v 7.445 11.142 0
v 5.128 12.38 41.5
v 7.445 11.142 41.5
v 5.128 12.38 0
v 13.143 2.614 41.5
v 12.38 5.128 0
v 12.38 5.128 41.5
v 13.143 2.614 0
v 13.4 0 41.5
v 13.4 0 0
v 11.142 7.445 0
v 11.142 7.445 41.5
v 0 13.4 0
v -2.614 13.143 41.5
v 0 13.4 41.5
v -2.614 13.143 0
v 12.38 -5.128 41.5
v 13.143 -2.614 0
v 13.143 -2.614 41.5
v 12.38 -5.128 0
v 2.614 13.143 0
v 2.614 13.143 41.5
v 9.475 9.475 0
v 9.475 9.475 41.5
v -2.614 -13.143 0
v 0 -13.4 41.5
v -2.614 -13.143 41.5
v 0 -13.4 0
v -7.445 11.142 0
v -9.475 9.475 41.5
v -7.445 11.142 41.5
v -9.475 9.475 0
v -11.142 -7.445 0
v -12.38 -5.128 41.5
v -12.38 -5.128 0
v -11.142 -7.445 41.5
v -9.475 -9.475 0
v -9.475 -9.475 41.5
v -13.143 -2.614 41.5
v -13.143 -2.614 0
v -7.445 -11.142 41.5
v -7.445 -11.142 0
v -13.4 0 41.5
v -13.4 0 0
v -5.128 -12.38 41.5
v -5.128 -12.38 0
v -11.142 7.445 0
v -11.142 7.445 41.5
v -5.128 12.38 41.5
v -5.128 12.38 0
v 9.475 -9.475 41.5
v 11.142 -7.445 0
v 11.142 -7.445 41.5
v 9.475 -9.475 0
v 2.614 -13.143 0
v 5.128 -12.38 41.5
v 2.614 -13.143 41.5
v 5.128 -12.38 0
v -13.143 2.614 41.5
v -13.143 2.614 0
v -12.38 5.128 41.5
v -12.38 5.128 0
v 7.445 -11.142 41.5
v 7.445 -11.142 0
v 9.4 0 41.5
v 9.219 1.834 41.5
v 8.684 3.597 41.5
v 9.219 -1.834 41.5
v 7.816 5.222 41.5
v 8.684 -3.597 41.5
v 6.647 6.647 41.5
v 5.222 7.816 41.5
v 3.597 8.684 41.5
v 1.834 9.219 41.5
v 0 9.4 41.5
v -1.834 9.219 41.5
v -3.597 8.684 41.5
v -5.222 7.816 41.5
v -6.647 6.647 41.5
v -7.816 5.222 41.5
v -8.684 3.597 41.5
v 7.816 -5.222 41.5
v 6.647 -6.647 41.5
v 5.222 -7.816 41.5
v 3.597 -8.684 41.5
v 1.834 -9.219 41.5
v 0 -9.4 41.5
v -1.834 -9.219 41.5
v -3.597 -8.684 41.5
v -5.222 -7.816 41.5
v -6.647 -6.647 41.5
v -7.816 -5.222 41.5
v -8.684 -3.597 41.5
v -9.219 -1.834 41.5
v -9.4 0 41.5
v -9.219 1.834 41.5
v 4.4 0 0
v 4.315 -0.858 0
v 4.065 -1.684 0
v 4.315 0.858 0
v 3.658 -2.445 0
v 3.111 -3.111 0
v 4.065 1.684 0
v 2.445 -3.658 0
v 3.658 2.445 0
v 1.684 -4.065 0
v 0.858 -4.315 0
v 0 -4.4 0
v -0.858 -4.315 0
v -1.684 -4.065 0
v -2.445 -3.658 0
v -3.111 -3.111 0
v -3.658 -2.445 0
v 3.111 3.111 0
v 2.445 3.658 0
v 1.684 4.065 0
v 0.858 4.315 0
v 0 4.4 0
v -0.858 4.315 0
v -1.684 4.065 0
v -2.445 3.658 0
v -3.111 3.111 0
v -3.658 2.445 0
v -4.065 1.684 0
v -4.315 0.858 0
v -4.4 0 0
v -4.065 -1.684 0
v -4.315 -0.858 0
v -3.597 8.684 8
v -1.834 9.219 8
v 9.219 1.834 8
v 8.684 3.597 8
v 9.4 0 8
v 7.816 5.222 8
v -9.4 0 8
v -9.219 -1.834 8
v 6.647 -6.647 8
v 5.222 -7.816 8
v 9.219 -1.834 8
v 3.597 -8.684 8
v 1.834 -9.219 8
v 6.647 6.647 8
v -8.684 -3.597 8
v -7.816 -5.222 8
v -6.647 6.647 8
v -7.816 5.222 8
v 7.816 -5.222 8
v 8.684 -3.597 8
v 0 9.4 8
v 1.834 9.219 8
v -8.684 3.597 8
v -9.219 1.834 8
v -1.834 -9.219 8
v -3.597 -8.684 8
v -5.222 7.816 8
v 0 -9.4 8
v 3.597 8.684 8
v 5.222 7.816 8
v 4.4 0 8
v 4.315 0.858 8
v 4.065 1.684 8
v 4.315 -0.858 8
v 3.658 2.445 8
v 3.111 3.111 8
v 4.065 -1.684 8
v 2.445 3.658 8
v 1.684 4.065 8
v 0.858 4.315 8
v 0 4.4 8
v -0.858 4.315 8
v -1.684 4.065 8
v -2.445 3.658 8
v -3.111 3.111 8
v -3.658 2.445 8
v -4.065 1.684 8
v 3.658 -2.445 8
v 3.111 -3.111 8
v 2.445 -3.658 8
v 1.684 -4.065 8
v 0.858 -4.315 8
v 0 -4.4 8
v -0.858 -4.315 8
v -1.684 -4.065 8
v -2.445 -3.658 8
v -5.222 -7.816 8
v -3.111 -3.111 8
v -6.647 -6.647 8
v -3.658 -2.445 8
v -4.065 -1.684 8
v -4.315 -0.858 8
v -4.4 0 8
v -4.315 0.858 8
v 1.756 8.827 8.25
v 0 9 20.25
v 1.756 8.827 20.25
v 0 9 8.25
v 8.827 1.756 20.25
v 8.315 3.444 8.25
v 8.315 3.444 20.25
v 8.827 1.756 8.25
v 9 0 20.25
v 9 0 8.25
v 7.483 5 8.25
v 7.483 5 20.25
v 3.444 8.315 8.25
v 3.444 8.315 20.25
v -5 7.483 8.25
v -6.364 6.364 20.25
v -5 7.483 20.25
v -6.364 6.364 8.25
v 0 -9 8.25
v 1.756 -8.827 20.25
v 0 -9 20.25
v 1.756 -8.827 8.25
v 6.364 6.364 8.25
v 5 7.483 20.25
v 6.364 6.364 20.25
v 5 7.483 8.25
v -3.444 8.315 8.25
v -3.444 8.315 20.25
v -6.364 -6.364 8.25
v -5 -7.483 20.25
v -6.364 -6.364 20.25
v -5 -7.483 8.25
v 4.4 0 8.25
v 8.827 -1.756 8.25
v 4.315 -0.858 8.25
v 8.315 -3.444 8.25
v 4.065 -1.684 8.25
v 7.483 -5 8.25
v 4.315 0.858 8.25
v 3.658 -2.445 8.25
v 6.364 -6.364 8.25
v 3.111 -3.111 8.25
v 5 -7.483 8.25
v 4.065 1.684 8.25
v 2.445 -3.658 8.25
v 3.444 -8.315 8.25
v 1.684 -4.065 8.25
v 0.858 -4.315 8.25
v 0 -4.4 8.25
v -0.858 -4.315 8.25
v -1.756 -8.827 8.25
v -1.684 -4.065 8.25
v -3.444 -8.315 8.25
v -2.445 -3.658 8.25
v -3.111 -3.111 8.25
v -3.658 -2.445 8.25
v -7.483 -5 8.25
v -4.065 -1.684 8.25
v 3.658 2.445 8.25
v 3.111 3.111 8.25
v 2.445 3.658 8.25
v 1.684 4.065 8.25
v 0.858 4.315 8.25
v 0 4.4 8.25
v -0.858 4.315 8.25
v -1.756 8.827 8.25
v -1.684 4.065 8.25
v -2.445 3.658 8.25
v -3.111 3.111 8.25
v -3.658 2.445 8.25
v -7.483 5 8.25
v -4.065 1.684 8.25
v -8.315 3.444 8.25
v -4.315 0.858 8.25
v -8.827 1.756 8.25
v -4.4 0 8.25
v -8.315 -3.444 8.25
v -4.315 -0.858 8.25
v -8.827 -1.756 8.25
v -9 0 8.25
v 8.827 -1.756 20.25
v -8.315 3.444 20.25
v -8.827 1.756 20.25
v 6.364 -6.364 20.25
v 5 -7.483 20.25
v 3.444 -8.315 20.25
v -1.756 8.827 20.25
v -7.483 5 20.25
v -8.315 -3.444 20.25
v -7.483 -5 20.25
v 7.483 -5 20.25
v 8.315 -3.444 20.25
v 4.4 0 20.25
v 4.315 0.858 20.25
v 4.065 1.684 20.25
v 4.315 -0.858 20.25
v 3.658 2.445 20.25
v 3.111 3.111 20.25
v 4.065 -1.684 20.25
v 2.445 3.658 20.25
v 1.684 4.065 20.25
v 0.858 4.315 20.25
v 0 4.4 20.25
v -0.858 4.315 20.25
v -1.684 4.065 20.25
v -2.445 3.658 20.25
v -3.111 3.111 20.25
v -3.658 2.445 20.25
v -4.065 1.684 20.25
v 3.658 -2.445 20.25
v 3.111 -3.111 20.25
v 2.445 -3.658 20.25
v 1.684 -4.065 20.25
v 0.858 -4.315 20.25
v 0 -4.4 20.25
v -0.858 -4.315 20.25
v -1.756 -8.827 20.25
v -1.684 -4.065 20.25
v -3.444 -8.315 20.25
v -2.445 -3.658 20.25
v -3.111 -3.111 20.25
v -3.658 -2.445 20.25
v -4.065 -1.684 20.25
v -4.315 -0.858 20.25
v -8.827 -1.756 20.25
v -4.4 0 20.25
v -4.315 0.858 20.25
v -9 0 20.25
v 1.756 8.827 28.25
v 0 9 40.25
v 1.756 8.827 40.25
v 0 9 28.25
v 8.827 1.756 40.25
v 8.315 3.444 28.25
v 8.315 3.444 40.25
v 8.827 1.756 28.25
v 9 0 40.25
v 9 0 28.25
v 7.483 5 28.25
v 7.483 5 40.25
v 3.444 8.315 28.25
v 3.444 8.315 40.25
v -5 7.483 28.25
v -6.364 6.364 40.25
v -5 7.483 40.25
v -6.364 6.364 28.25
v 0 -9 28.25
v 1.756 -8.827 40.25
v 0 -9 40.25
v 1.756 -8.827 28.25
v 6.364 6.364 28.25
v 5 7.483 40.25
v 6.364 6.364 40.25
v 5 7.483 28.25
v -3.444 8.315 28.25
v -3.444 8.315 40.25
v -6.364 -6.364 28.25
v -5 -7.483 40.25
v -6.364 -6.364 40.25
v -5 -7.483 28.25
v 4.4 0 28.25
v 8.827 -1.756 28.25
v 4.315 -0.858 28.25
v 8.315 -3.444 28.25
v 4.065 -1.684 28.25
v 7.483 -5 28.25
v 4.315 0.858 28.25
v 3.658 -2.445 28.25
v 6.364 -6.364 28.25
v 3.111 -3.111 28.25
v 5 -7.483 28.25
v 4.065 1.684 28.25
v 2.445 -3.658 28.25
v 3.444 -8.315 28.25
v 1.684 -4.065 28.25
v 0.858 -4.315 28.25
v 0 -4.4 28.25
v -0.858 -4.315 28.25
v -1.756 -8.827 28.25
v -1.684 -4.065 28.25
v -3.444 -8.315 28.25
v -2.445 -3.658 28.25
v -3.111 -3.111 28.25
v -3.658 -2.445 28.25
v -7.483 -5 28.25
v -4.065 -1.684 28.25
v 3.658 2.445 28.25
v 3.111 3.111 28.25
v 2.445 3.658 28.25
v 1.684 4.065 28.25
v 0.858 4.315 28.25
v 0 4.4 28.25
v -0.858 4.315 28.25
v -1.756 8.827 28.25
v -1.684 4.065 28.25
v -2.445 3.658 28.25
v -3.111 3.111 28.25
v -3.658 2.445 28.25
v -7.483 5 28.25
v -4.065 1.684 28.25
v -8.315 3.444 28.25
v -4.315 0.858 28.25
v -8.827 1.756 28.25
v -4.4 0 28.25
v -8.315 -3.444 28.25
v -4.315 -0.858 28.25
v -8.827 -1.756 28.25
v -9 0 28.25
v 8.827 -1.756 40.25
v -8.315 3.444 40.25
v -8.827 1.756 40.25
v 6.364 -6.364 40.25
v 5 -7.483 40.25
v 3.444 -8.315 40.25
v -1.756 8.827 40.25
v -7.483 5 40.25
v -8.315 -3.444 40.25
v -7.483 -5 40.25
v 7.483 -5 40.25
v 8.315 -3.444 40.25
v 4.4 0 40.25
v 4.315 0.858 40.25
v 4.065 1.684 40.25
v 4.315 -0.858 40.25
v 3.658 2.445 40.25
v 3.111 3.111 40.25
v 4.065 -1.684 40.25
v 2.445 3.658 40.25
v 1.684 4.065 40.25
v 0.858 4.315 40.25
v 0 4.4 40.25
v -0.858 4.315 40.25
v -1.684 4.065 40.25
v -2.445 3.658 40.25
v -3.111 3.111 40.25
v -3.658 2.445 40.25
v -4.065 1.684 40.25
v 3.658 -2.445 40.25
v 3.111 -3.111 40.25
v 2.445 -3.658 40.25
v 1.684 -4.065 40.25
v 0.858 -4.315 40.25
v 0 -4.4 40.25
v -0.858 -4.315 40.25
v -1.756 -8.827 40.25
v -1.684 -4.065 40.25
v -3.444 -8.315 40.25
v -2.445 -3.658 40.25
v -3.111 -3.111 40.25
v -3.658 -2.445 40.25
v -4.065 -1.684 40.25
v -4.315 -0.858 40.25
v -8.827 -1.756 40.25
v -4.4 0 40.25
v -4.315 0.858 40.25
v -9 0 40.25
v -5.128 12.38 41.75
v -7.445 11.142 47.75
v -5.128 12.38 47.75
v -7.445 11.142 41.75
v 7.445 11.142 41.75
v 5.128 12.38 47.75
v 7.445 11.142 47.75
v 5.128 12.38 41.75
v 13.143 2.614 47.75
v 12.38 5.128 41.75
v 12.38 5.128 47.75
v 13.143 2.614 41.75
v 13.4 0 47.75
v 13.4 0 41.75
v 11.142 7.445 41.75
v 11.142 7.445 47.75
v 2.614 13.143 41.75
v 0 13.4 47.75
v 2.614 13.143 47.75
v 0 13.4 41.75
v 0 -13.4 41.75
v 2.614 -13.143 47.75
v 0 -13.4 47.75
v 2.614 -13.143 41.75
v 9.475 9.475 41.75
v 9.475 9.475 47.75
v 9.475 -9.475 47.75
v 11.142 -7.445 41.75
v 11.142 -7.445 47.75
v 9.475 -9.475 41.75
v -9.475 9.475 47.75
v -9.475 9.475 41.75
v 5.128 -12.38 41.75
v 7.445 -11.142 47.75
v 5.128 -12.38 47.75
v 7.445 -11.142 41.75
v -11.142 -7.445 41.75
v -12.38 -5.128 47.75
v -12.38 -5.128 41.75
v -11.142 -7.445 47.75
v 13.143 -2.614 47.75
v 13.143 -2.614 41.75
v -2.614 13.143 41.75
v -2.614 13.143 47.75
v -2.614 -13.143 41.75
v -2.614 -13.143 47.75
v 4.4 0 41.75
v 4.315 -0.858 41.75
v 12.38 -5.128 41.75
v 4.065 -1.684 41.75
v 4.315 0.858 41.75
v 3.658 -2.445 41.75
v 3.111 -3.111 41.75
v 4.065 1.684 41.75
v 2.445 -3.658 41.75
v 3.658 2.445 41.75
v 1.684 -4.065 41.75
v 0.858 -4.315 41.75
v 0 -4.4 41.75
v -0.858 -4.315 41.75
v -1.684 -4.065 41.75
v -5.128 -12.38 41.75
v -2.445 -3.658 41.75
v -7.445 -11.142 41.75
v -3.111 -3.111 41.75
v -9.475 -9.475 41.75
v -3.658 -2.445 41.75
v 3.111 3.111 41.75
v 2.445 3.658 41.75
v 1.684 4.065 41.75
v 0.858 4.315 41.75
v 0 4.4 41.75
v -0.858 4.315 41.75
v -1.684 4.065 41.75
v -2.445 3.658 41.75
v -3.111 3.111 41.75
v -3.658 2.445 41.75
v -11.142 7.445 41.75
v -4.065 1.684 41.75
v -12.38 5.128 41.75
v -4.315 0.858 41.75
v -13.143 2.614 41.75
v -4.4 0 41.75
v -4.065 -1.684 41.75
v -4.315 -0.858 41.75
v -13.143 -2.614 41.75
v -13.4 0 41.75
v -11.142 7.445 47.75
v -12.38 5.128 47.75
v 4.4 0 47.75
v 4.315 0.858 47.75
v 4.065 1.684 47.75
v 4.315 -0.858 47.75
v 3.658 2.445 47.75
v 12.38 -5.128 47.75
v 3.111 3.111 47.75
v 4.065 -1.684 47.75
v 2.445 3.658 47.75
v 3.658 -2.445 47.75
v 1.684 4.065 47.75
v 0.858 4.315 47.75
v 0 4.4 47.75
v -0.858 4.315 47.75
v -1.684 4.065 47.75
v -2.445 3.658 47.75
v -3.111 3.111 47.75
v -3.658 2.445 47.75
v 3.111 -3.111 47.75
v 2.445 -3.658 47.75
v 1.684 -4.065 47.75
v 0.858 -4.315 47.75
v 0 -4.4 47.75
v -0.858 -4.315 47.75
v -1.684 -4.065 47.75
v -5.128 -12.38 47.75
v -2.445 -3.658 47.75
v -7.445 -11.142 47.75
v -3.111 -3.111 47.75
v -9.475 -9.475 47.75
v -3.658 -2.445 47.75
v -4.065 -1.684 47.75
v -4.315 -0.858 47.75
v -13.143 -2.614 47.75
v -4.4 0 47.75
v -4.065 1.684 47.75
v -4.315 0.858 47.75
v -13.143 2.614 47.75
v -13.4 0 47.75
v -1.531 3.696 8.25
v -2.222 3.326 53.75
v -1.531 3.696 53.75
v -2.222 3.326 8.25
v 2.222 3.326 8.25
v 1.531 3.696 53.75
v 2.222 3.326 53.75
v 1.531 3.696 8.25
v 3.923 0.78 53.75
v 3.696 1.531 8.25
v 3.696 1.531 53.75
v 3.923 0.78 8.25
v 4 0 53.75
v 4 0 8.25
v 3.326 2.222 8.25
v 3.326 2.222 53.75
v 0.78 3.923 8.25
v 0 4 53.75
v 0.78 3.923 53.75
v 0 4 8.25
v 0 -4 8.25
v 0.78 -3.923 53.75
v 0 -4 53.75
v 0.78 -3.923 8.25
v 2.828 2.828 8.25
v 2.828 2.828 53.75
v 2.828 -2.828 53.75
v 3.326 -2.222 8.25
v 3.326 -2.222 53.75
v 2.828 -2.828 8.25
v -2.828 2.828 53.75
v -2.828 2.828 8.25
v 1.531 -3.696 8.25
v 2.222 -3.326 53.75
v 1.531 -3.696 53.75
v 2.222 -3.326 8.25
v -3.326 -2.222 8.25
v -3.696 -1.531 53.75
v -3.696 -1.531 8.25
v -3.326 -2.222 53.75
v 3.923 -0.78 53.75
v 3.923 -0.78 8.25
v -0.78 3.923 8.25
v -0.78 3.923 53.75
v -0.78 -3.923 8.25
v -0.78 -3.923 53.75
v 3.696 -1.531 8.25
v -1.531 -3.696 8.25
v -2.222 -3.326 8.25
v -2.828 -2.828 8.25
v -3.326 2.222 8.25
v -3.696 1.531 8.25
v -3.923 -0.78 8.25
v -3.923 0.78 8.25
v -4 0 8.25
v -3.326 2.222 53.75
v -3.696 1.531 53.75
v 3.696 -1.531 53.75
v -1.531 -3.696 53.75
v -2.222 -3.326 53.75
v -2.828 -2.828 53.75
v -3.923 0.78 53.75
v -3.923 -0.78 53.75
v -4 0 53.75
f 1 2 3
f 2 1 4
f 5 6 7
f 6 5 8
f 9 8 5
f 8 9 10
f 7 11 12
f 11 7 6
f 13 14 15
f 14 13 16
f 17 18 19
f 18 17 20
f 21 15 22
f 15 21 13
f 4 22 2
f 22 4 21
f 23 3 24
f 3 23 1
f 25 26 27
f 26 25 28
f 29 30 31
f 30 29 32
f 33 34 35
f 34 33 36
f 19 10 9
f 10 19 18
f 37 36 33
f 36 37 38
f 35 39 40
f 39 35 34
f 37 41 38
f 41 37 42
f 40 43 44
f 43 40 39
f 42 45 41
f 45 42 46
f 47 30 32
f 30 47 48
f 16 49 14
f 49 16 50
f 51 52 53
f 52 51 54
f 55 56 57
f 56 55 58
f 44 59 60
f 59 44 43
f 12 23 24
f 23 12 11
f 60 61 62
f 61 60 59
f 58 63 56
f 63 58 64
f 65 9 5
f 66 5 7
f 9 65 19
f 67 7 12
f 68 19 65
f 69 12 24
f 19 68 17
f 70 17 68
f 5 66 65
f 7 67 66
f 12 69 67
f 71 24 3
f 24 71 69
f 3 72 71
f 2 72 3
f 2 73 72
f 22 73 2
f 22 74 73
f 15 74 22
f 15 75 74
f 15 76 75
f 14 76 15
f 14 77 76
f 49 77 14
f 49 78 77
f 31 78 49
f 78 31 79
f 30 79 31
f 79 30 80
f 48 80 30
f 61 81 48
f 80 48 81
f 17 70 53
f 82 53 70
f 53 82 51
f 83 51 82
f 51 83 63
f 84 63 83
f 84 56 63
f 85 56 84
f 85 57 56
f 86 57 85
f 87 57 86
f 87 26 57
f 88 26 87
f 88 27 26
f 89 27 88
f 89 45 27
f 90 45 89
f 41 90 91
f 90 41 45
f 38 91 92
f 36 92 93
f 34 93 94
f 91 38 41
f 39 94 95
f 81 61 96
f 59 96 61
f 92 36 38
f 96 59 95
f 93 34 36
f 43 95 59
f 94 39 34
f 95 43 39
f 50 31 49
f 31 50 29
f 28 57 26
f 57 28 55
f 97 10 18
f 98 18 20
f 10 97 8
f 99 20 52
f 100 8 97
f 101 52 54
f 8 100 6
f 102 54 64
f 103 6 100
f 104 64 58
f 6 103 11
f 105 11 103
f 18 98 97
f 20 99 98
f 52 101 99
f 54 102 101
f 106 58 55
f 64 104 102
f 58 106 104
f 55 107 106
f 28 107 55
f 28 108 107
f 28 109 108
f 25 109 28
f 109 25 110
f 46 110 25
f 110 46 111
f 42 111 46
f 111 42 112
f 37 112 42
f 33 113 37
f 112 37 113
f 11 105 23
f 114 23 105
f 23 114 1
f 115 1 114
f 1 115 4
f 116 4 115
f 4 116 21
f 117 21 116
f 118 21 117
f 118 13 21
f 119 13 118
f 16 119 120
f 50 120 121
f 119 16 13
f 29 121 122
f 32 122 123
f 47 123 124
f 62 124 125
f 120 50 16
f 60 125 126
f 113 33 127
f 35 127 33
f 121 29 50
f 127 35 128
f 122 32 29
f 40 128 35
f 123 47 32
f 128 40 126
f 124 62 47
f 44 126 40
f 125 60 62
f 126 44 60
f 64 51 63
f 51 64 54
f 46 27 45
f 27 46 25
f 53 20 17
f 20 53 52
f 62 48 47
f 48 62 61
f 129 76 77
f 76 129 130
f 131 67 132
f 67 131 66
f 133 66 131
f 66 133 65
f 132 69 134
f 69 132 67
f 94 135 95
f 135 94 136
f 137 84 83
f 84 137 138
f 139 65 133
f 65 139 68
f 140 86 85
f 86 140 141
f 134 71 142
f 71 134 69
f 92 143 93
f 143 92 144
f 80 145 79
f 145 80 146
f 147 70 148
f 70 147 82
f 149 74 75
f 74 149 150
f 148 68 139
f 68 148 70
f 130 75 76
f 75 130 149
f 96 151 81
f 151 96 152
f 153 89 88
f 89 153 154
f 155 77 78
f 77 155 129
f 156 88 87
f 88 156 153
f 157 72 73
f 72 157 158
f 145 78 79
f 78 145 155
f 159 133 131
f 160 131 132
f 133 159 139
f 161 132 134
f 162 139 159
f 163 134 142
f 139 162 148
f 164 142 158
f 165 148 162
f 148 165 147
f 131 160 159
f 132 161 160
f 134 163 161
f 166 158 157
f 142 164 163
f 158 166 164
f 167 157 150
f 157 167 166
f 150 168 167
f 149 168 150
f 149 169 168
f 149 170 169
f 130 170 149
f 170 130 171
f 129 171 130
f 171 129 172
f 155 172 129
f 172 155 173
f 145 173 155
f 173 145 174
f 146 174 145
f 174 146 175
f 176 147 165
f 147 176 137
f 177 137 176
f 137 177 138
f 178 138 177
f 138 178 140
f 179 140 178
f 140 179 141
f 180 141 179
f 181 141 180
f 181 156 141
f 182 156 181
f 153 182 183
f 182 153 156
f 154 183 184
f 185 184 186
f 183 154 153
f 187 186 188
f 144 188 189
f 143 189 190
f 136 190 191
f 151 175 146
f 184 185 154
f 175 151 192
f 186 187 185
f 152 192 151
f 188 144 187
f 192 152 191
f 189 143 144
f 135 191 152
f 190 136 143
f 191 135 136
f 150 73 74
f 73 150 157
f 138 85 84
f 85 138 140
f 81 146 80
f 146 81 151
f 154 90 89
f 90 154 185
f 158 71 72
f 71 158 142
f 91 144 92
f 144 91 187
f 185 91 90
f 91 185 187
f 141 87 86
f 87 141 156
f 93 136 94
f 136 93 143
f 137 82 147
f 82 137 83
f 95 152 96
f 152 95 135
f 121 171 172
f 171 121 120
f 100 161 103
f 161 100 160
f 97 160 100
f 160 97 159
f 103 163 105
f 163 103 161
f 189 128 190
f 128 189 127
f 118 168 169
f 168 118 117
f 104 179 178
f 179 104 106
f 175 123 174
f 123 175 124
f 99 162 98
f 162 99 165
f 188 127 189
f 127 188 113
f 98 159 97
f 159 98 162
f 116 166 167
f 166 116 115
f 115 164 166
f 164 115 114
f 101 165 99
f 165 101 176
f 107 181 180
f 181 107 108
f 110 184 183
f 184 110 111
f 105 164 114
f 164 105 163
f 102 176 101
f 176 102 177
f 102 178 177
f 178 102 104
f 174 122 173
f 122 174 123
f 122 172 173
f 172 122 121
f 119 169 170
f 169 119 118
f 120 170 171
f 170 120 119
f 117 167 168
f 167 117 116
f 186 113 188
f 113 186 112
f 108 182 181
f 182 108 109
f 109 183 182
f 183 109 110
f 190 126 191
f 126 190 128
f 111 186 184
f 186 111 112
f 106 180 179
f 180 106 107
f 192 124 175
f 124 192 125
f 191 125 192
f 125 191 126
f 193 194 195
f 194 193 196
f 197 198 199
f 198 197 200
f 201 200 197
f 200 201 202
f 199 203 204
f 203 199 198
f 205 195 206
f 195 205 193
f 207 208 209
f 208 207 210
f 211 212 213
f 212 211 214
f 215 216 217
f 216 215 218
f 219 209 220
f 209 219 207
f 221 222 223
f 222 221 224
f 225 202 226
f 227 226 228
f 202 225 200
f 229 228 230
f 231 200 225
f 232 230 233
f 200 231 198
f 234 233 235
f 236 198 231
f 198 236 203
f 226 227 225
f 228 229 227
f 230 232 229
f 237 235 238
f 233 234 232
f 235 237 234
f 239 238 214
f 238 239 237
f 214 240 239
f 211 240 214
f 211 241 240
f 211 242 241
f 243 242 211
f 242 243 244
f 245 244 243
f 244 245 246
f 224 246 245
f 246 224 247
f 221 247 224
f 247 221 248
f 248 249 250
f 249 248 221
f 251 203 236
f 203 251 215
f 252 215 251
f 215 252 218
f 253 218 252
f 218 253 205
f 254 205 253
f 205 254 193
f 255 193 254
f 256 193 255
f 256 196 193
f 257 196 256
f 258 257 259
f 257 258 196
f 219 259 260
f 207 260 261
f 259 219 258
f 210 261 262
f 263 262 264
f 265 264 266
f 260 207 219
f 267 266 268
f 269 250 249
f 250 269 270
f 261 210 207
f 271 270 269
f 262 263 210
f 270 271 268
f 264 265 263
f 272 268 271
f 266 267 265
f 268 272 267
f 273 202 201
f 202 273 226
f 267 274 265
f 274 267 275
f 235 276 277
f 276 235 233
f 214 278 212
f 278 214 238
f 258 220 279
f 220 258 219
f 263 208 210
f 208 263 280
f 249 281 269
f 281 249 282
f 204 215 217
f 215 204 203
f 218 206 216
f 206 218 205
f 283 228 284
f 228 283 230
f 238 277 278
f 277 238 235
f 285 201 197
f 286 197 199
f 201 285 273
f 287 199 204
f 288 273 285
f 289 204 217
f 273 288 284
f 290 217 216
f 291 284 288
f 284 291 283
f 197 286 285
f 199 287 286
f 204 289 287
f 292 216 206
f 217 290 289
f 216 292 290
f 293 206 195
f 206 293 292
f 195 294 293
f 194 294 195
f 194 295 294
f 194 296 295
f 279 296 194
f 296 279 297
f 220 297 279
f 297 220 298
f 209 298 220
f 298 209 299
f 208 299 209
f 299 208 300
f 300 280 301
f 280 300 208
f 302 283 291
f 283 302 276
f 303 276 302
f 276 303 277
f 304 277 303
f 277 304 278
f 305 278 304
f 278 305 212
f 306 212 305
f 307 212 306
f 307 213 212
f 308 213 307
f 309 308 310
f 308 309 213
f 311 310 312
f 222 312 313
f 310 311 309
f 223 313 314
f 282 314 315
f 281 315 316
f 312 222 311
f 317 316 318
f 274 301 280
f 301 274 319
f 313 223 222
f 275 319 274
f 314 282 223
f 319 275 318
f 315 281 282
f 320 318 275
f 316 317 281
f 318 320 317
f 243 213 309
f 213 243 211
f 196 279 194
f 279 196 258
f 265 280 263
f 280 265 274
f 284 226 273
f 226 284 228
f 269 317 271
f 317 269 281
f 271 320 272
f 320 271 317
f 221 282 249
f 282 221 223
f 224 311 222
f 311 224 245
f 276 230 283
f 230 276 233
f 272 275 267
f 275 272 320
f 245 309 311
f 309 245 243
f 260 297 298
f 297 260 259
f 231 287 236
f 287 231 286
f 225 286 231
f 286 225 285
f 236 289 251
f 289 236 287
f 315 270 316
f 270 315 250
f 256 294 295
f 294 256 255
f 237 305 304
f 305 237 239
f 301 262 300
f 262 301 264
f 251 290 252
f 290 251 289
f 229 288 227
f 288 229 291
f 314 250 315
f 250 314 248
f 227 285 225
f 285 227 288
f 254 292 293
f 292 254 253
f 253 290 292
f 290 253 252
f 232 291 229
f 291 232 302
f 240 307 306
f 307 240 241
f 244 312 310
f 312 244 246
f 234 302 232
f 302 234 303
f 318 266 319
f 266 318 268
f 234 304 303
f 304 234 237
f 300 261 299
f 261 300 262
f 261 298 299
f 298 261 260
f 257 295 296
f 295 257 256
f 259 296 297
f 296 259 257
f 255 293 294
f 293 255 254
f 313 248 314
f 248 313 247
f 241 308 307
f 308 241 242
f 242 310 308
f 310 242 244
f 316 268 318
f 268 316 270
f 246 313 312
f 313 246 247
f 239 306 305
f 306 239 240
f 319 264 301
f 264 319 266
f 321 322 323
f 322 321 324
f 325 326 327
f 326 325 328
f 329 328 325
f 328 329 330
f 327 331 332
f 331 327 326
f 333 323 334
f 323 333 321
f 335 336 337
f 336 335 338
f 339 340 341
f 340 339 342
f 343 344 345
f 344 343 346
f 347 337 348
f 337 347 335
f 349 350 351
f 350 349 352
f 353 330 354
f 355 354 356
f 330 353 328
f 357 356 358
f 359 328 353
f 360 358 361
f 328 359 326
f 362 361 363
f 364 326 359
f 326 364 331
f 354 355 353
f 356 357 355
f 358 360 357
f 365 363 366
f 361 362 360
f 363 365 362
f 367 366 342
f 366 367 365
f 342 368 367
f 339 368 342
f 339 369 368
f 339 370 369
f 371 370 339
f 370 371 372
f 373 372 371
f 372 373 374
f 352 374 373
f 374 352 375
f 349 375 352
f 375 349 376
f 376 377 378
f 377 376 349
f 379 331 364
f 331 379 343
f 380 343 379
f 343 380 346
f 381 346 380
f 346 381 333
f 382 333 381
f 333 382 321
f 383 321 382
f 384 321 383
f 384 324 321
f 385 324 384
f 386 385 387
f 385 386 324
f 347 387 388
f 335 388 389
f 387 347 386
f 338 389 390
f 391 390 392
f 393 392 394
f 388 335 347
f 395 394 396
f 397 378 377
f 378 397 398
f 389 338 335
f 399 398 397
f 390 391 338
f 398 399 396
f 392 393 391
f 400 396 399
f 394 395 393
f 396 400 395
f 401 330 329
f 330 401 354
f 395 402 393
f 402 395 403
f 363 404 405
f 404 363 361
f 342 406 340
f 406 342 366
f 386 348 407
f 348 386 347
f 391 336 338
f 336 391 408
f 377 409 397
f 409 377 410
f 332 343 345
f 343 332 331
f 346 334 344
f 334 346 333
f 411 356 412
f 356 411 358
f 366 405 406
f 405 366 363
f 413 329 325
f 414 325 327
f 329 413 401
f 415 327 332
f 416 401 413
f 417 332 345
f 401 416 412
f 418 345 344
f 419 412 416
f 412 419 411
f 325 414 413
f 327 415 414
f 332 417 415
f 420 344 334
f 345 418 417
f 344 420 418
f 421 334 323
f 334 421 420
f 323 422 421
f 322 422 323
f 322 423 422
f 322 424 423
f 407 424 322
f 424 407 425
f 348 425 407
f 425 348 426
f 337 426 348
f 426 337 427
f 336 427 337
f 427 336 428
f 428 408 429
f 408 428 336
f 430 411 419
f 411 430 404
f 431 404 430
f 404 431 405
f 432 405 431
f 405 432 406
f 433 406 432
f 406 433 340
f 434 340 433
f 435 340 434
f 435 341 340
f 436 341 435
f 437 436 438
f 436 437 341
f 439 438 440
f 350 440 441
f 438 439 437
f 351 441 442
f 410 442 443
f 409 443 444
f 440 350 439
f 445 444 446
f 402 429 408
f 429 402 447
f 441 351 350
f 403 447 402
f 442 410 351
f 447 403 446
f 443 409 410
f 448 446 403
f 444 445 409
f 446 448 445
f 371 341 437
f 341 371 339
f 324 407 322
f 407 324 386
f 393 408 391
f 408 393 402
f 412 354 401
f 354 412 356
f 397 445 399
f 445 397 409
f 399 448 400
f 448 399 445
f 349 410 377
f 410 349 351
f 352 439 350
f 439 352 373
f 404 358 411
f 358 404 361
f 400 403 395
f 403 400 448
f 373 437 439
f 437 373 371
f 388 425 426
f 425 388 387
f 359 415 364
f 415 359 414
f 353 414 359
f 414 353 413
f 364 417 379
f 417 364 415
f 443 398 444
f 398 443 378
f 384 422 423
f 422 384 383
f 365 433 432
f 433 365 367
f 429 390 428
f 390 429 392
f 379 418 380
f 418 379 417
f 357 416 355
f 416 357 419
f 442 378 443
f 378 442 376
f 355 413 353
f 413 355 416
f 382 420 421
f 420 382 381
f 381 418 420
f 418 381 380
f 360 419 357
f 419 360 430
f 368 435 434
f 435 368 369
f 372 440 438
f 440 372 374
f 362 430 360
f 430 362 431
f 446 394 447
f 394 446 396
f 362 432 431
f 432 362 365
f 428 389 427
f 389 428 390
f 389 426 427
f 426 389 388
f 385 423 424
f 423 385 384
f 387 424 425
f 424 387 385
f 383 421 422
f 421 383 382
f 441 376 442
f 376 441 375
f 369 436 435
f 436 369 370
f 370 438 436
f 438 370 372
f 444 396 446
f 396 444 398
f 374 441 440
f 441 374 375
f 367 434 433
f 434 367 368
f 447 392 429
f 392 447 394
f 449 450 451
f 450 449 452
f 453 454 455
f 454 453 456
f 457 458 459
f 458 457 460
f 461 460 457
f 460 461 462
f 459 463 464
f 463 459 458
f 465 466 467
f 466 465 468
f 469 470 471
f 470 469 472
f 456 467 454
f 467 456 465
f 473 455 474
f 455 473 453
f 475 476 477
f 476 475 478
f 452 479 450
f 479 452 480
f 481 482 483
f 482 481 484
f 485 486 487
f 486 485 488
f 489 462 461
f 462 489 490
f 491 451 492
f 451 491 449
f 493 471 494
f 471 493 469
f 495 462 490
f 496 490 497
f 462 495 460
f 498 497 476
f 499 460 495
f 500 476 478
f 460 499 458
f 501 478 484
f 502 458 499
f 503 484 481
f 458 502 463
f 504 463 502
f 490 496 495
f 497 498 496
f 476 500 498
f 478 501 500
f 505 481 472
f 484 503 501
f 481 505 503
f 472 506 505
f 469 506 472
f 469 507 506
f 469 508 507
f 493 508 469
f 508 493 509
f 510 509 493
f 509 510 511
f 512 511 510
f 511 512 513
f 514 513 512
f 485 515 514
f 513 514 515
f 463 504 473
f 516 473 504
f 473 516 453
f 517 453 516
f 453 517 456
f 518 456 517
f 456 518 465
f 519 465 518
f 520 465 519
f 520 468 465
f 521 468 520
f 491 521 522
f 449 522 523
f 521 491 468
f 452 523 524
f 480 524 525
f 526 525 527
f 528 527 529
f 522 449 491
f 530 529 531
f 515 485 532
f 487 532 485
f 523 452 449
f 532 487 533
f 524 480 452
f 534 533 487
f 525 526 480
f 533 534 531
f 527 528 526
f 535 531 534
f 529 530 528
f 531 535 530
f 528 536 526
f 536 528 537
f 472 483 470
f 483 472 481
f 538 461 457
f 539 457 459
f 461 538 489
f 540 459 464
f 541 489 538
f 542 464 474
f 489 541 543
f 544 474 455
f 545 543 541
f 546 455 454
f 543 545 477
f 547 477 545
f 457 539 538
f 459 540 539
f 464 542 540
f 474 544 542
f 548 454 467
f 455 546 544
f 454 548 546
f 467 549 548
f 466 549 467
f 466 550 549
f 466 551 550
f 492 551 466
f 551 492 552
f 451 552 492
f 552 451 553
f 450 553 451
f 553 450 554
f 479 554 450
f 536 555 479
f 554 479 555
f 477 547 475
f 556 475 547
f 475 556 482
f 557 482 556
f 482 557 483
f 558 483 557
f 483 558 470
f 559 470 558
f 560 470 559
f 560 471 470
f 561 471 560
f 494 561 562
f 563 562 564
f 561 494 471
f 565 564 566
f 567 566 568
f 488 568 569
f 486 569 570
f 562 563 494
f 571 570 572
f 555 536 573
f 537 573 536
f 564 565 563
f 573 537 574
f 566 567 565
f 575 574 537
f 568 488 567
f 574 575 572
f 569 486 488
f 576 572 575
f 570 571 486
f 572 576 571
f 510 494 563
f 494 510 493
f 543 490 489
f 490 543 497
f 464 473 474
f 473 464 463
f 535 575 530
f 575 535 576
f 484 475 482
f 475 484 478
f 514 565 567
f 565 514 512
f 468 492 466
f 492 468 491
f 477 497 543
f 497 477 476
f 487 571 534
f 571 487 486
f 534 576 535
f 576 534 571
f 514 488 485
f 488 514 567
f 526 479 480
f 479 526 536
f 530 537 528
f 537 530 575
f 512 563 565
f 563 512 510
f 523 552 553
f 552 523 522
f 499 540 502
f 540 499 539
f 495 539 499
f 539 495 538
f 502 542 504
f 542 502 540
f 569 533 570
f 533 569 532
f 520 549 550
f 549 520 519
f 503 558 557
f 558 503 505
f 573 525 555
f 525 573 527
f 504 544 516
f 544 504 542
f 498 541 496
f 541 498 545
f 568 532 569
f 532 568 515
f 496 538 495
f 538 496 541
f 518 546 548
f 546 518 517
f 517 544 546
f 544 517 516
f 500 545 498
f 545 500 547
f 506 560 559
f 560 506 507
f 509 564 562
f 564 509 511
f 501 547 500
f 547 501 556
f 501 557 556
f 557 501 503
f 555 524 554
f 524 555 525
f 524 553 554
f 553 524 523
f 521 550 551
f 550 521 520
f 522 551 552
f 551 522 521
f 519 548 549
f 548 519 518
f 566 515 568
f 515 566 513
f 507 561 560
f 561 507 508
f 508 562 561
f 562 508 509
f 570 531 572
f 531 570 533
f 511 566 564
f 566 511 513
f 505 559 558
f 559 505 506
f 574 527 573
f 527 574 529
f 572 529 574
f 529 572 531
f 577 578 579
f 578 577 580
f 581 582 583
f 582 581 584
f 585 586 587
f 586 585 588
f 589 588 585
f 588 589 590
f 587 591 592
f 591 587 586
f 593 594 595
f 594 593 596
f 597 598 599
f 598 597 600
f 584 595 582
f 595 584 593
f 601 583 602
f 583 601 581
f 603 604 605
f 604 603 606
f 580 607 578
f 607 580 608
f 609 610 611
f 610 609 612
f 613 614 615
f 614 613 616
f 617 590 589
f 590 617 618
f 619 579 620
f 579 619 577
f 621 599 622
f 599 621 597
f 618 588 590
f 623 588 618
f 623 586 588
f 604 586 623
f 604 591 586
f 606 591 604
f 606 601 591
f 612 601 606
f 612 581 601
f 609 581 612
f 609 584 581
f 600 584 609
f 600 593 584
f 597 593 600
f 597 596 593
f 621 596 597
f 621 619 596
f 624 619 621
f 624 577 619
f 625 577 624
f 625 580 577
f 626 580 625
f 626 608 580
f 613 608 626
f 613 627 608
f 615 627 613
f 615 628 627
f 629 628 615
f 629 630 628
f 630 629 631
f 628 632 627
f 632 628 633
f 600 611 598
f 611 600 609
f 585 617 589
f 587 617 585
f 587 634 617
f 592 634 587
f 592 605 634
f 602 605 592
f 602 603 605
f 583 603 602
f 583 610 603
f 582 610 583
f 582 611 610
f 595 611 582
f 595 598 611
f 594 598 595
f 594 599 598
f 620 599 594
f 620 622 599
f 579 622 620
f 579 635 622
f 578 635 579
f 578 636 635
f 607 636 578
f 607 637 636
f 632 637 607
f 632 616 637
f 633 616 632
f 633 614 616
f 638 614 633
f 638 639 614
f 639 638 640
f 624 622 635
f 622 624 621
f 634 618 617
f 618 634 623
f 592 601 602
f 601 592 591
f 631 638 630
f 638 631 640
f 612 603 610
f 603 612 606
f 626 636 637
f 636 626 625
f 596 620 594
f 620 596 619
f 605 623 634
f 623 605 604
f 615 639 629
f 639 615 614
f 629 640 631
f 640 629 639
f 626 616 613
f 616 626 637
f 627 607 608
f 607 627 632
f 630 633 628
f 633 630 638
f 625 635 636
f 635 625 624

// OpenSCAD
$fn = 32;

// ------------------------------------------------------------------------
// Shaft station: cup d26.8 x 41.5 mm, shaft d8
// Every part is its own module, assembly() places every instance.
// ------------------------------------------------------------------------

// --- part 1 ---
module housing_cup() {
  difference() {
    cylinder(h = 41.5, d = 26.8);
    translate([0, 0, 8]) cylinder(h = 34.5, d = 18.8);
    translate([0, 0, -1]) cylinder(h = 10, d = 8.8);
  }
}

// --- part 2 ---
module bearing_lower() {
  difference() {
      translate([0, 0, 0]) cylinder(h = 12, d = 18);
      translate([0, 0, -1]) cylinder(h = 14, d = 8.8);
    }
}

// --- part 3 ---
module bearing_upper() {
  difference() {
      translate([0, 0, 0]) cylinder(h = 12, d = 18);
      translate([0, 0, -1]) cylinder(h = 14, d = 8.8);
    }
}

// --- part 4 ---
module station_shaft() {
  translate([0, 0, -22.75]) cylinder(h = 45.5, d = 8);
}

// --- part 5 ---
module station_cover() {
  difference() {
    cylinder(h = 6, d = 26.8);
    translate([0, 0, -1]) cylinder(h = 8, d = 8.8);
  }
}

// --- assembly ---
module assembly() {
  color([0.80, 0.24, 0.20]) translate([0, 0, 0]) rotate([0, 0, 0]) housing_cup();
  color([0.20, 0.45, 0.75]) translate([0, 0, 8.25]) rotate([0, 0, 0]) bearing_lower();
  color([0.25, 0.62, 0.32]) translate([0, 0, 28.25]) rotate([0, 0, 0]) bearing_upper();
  color([0.92, 0.70, 0.18]) translate([0, 0, 31]) rotate([0, 0, 0]) station_shaft();
  color([0.58, 0.35, 0.70]) translate([0, 0, 41.75]) rotate([0, 0, 0]) station_cover();
}

assembly();
